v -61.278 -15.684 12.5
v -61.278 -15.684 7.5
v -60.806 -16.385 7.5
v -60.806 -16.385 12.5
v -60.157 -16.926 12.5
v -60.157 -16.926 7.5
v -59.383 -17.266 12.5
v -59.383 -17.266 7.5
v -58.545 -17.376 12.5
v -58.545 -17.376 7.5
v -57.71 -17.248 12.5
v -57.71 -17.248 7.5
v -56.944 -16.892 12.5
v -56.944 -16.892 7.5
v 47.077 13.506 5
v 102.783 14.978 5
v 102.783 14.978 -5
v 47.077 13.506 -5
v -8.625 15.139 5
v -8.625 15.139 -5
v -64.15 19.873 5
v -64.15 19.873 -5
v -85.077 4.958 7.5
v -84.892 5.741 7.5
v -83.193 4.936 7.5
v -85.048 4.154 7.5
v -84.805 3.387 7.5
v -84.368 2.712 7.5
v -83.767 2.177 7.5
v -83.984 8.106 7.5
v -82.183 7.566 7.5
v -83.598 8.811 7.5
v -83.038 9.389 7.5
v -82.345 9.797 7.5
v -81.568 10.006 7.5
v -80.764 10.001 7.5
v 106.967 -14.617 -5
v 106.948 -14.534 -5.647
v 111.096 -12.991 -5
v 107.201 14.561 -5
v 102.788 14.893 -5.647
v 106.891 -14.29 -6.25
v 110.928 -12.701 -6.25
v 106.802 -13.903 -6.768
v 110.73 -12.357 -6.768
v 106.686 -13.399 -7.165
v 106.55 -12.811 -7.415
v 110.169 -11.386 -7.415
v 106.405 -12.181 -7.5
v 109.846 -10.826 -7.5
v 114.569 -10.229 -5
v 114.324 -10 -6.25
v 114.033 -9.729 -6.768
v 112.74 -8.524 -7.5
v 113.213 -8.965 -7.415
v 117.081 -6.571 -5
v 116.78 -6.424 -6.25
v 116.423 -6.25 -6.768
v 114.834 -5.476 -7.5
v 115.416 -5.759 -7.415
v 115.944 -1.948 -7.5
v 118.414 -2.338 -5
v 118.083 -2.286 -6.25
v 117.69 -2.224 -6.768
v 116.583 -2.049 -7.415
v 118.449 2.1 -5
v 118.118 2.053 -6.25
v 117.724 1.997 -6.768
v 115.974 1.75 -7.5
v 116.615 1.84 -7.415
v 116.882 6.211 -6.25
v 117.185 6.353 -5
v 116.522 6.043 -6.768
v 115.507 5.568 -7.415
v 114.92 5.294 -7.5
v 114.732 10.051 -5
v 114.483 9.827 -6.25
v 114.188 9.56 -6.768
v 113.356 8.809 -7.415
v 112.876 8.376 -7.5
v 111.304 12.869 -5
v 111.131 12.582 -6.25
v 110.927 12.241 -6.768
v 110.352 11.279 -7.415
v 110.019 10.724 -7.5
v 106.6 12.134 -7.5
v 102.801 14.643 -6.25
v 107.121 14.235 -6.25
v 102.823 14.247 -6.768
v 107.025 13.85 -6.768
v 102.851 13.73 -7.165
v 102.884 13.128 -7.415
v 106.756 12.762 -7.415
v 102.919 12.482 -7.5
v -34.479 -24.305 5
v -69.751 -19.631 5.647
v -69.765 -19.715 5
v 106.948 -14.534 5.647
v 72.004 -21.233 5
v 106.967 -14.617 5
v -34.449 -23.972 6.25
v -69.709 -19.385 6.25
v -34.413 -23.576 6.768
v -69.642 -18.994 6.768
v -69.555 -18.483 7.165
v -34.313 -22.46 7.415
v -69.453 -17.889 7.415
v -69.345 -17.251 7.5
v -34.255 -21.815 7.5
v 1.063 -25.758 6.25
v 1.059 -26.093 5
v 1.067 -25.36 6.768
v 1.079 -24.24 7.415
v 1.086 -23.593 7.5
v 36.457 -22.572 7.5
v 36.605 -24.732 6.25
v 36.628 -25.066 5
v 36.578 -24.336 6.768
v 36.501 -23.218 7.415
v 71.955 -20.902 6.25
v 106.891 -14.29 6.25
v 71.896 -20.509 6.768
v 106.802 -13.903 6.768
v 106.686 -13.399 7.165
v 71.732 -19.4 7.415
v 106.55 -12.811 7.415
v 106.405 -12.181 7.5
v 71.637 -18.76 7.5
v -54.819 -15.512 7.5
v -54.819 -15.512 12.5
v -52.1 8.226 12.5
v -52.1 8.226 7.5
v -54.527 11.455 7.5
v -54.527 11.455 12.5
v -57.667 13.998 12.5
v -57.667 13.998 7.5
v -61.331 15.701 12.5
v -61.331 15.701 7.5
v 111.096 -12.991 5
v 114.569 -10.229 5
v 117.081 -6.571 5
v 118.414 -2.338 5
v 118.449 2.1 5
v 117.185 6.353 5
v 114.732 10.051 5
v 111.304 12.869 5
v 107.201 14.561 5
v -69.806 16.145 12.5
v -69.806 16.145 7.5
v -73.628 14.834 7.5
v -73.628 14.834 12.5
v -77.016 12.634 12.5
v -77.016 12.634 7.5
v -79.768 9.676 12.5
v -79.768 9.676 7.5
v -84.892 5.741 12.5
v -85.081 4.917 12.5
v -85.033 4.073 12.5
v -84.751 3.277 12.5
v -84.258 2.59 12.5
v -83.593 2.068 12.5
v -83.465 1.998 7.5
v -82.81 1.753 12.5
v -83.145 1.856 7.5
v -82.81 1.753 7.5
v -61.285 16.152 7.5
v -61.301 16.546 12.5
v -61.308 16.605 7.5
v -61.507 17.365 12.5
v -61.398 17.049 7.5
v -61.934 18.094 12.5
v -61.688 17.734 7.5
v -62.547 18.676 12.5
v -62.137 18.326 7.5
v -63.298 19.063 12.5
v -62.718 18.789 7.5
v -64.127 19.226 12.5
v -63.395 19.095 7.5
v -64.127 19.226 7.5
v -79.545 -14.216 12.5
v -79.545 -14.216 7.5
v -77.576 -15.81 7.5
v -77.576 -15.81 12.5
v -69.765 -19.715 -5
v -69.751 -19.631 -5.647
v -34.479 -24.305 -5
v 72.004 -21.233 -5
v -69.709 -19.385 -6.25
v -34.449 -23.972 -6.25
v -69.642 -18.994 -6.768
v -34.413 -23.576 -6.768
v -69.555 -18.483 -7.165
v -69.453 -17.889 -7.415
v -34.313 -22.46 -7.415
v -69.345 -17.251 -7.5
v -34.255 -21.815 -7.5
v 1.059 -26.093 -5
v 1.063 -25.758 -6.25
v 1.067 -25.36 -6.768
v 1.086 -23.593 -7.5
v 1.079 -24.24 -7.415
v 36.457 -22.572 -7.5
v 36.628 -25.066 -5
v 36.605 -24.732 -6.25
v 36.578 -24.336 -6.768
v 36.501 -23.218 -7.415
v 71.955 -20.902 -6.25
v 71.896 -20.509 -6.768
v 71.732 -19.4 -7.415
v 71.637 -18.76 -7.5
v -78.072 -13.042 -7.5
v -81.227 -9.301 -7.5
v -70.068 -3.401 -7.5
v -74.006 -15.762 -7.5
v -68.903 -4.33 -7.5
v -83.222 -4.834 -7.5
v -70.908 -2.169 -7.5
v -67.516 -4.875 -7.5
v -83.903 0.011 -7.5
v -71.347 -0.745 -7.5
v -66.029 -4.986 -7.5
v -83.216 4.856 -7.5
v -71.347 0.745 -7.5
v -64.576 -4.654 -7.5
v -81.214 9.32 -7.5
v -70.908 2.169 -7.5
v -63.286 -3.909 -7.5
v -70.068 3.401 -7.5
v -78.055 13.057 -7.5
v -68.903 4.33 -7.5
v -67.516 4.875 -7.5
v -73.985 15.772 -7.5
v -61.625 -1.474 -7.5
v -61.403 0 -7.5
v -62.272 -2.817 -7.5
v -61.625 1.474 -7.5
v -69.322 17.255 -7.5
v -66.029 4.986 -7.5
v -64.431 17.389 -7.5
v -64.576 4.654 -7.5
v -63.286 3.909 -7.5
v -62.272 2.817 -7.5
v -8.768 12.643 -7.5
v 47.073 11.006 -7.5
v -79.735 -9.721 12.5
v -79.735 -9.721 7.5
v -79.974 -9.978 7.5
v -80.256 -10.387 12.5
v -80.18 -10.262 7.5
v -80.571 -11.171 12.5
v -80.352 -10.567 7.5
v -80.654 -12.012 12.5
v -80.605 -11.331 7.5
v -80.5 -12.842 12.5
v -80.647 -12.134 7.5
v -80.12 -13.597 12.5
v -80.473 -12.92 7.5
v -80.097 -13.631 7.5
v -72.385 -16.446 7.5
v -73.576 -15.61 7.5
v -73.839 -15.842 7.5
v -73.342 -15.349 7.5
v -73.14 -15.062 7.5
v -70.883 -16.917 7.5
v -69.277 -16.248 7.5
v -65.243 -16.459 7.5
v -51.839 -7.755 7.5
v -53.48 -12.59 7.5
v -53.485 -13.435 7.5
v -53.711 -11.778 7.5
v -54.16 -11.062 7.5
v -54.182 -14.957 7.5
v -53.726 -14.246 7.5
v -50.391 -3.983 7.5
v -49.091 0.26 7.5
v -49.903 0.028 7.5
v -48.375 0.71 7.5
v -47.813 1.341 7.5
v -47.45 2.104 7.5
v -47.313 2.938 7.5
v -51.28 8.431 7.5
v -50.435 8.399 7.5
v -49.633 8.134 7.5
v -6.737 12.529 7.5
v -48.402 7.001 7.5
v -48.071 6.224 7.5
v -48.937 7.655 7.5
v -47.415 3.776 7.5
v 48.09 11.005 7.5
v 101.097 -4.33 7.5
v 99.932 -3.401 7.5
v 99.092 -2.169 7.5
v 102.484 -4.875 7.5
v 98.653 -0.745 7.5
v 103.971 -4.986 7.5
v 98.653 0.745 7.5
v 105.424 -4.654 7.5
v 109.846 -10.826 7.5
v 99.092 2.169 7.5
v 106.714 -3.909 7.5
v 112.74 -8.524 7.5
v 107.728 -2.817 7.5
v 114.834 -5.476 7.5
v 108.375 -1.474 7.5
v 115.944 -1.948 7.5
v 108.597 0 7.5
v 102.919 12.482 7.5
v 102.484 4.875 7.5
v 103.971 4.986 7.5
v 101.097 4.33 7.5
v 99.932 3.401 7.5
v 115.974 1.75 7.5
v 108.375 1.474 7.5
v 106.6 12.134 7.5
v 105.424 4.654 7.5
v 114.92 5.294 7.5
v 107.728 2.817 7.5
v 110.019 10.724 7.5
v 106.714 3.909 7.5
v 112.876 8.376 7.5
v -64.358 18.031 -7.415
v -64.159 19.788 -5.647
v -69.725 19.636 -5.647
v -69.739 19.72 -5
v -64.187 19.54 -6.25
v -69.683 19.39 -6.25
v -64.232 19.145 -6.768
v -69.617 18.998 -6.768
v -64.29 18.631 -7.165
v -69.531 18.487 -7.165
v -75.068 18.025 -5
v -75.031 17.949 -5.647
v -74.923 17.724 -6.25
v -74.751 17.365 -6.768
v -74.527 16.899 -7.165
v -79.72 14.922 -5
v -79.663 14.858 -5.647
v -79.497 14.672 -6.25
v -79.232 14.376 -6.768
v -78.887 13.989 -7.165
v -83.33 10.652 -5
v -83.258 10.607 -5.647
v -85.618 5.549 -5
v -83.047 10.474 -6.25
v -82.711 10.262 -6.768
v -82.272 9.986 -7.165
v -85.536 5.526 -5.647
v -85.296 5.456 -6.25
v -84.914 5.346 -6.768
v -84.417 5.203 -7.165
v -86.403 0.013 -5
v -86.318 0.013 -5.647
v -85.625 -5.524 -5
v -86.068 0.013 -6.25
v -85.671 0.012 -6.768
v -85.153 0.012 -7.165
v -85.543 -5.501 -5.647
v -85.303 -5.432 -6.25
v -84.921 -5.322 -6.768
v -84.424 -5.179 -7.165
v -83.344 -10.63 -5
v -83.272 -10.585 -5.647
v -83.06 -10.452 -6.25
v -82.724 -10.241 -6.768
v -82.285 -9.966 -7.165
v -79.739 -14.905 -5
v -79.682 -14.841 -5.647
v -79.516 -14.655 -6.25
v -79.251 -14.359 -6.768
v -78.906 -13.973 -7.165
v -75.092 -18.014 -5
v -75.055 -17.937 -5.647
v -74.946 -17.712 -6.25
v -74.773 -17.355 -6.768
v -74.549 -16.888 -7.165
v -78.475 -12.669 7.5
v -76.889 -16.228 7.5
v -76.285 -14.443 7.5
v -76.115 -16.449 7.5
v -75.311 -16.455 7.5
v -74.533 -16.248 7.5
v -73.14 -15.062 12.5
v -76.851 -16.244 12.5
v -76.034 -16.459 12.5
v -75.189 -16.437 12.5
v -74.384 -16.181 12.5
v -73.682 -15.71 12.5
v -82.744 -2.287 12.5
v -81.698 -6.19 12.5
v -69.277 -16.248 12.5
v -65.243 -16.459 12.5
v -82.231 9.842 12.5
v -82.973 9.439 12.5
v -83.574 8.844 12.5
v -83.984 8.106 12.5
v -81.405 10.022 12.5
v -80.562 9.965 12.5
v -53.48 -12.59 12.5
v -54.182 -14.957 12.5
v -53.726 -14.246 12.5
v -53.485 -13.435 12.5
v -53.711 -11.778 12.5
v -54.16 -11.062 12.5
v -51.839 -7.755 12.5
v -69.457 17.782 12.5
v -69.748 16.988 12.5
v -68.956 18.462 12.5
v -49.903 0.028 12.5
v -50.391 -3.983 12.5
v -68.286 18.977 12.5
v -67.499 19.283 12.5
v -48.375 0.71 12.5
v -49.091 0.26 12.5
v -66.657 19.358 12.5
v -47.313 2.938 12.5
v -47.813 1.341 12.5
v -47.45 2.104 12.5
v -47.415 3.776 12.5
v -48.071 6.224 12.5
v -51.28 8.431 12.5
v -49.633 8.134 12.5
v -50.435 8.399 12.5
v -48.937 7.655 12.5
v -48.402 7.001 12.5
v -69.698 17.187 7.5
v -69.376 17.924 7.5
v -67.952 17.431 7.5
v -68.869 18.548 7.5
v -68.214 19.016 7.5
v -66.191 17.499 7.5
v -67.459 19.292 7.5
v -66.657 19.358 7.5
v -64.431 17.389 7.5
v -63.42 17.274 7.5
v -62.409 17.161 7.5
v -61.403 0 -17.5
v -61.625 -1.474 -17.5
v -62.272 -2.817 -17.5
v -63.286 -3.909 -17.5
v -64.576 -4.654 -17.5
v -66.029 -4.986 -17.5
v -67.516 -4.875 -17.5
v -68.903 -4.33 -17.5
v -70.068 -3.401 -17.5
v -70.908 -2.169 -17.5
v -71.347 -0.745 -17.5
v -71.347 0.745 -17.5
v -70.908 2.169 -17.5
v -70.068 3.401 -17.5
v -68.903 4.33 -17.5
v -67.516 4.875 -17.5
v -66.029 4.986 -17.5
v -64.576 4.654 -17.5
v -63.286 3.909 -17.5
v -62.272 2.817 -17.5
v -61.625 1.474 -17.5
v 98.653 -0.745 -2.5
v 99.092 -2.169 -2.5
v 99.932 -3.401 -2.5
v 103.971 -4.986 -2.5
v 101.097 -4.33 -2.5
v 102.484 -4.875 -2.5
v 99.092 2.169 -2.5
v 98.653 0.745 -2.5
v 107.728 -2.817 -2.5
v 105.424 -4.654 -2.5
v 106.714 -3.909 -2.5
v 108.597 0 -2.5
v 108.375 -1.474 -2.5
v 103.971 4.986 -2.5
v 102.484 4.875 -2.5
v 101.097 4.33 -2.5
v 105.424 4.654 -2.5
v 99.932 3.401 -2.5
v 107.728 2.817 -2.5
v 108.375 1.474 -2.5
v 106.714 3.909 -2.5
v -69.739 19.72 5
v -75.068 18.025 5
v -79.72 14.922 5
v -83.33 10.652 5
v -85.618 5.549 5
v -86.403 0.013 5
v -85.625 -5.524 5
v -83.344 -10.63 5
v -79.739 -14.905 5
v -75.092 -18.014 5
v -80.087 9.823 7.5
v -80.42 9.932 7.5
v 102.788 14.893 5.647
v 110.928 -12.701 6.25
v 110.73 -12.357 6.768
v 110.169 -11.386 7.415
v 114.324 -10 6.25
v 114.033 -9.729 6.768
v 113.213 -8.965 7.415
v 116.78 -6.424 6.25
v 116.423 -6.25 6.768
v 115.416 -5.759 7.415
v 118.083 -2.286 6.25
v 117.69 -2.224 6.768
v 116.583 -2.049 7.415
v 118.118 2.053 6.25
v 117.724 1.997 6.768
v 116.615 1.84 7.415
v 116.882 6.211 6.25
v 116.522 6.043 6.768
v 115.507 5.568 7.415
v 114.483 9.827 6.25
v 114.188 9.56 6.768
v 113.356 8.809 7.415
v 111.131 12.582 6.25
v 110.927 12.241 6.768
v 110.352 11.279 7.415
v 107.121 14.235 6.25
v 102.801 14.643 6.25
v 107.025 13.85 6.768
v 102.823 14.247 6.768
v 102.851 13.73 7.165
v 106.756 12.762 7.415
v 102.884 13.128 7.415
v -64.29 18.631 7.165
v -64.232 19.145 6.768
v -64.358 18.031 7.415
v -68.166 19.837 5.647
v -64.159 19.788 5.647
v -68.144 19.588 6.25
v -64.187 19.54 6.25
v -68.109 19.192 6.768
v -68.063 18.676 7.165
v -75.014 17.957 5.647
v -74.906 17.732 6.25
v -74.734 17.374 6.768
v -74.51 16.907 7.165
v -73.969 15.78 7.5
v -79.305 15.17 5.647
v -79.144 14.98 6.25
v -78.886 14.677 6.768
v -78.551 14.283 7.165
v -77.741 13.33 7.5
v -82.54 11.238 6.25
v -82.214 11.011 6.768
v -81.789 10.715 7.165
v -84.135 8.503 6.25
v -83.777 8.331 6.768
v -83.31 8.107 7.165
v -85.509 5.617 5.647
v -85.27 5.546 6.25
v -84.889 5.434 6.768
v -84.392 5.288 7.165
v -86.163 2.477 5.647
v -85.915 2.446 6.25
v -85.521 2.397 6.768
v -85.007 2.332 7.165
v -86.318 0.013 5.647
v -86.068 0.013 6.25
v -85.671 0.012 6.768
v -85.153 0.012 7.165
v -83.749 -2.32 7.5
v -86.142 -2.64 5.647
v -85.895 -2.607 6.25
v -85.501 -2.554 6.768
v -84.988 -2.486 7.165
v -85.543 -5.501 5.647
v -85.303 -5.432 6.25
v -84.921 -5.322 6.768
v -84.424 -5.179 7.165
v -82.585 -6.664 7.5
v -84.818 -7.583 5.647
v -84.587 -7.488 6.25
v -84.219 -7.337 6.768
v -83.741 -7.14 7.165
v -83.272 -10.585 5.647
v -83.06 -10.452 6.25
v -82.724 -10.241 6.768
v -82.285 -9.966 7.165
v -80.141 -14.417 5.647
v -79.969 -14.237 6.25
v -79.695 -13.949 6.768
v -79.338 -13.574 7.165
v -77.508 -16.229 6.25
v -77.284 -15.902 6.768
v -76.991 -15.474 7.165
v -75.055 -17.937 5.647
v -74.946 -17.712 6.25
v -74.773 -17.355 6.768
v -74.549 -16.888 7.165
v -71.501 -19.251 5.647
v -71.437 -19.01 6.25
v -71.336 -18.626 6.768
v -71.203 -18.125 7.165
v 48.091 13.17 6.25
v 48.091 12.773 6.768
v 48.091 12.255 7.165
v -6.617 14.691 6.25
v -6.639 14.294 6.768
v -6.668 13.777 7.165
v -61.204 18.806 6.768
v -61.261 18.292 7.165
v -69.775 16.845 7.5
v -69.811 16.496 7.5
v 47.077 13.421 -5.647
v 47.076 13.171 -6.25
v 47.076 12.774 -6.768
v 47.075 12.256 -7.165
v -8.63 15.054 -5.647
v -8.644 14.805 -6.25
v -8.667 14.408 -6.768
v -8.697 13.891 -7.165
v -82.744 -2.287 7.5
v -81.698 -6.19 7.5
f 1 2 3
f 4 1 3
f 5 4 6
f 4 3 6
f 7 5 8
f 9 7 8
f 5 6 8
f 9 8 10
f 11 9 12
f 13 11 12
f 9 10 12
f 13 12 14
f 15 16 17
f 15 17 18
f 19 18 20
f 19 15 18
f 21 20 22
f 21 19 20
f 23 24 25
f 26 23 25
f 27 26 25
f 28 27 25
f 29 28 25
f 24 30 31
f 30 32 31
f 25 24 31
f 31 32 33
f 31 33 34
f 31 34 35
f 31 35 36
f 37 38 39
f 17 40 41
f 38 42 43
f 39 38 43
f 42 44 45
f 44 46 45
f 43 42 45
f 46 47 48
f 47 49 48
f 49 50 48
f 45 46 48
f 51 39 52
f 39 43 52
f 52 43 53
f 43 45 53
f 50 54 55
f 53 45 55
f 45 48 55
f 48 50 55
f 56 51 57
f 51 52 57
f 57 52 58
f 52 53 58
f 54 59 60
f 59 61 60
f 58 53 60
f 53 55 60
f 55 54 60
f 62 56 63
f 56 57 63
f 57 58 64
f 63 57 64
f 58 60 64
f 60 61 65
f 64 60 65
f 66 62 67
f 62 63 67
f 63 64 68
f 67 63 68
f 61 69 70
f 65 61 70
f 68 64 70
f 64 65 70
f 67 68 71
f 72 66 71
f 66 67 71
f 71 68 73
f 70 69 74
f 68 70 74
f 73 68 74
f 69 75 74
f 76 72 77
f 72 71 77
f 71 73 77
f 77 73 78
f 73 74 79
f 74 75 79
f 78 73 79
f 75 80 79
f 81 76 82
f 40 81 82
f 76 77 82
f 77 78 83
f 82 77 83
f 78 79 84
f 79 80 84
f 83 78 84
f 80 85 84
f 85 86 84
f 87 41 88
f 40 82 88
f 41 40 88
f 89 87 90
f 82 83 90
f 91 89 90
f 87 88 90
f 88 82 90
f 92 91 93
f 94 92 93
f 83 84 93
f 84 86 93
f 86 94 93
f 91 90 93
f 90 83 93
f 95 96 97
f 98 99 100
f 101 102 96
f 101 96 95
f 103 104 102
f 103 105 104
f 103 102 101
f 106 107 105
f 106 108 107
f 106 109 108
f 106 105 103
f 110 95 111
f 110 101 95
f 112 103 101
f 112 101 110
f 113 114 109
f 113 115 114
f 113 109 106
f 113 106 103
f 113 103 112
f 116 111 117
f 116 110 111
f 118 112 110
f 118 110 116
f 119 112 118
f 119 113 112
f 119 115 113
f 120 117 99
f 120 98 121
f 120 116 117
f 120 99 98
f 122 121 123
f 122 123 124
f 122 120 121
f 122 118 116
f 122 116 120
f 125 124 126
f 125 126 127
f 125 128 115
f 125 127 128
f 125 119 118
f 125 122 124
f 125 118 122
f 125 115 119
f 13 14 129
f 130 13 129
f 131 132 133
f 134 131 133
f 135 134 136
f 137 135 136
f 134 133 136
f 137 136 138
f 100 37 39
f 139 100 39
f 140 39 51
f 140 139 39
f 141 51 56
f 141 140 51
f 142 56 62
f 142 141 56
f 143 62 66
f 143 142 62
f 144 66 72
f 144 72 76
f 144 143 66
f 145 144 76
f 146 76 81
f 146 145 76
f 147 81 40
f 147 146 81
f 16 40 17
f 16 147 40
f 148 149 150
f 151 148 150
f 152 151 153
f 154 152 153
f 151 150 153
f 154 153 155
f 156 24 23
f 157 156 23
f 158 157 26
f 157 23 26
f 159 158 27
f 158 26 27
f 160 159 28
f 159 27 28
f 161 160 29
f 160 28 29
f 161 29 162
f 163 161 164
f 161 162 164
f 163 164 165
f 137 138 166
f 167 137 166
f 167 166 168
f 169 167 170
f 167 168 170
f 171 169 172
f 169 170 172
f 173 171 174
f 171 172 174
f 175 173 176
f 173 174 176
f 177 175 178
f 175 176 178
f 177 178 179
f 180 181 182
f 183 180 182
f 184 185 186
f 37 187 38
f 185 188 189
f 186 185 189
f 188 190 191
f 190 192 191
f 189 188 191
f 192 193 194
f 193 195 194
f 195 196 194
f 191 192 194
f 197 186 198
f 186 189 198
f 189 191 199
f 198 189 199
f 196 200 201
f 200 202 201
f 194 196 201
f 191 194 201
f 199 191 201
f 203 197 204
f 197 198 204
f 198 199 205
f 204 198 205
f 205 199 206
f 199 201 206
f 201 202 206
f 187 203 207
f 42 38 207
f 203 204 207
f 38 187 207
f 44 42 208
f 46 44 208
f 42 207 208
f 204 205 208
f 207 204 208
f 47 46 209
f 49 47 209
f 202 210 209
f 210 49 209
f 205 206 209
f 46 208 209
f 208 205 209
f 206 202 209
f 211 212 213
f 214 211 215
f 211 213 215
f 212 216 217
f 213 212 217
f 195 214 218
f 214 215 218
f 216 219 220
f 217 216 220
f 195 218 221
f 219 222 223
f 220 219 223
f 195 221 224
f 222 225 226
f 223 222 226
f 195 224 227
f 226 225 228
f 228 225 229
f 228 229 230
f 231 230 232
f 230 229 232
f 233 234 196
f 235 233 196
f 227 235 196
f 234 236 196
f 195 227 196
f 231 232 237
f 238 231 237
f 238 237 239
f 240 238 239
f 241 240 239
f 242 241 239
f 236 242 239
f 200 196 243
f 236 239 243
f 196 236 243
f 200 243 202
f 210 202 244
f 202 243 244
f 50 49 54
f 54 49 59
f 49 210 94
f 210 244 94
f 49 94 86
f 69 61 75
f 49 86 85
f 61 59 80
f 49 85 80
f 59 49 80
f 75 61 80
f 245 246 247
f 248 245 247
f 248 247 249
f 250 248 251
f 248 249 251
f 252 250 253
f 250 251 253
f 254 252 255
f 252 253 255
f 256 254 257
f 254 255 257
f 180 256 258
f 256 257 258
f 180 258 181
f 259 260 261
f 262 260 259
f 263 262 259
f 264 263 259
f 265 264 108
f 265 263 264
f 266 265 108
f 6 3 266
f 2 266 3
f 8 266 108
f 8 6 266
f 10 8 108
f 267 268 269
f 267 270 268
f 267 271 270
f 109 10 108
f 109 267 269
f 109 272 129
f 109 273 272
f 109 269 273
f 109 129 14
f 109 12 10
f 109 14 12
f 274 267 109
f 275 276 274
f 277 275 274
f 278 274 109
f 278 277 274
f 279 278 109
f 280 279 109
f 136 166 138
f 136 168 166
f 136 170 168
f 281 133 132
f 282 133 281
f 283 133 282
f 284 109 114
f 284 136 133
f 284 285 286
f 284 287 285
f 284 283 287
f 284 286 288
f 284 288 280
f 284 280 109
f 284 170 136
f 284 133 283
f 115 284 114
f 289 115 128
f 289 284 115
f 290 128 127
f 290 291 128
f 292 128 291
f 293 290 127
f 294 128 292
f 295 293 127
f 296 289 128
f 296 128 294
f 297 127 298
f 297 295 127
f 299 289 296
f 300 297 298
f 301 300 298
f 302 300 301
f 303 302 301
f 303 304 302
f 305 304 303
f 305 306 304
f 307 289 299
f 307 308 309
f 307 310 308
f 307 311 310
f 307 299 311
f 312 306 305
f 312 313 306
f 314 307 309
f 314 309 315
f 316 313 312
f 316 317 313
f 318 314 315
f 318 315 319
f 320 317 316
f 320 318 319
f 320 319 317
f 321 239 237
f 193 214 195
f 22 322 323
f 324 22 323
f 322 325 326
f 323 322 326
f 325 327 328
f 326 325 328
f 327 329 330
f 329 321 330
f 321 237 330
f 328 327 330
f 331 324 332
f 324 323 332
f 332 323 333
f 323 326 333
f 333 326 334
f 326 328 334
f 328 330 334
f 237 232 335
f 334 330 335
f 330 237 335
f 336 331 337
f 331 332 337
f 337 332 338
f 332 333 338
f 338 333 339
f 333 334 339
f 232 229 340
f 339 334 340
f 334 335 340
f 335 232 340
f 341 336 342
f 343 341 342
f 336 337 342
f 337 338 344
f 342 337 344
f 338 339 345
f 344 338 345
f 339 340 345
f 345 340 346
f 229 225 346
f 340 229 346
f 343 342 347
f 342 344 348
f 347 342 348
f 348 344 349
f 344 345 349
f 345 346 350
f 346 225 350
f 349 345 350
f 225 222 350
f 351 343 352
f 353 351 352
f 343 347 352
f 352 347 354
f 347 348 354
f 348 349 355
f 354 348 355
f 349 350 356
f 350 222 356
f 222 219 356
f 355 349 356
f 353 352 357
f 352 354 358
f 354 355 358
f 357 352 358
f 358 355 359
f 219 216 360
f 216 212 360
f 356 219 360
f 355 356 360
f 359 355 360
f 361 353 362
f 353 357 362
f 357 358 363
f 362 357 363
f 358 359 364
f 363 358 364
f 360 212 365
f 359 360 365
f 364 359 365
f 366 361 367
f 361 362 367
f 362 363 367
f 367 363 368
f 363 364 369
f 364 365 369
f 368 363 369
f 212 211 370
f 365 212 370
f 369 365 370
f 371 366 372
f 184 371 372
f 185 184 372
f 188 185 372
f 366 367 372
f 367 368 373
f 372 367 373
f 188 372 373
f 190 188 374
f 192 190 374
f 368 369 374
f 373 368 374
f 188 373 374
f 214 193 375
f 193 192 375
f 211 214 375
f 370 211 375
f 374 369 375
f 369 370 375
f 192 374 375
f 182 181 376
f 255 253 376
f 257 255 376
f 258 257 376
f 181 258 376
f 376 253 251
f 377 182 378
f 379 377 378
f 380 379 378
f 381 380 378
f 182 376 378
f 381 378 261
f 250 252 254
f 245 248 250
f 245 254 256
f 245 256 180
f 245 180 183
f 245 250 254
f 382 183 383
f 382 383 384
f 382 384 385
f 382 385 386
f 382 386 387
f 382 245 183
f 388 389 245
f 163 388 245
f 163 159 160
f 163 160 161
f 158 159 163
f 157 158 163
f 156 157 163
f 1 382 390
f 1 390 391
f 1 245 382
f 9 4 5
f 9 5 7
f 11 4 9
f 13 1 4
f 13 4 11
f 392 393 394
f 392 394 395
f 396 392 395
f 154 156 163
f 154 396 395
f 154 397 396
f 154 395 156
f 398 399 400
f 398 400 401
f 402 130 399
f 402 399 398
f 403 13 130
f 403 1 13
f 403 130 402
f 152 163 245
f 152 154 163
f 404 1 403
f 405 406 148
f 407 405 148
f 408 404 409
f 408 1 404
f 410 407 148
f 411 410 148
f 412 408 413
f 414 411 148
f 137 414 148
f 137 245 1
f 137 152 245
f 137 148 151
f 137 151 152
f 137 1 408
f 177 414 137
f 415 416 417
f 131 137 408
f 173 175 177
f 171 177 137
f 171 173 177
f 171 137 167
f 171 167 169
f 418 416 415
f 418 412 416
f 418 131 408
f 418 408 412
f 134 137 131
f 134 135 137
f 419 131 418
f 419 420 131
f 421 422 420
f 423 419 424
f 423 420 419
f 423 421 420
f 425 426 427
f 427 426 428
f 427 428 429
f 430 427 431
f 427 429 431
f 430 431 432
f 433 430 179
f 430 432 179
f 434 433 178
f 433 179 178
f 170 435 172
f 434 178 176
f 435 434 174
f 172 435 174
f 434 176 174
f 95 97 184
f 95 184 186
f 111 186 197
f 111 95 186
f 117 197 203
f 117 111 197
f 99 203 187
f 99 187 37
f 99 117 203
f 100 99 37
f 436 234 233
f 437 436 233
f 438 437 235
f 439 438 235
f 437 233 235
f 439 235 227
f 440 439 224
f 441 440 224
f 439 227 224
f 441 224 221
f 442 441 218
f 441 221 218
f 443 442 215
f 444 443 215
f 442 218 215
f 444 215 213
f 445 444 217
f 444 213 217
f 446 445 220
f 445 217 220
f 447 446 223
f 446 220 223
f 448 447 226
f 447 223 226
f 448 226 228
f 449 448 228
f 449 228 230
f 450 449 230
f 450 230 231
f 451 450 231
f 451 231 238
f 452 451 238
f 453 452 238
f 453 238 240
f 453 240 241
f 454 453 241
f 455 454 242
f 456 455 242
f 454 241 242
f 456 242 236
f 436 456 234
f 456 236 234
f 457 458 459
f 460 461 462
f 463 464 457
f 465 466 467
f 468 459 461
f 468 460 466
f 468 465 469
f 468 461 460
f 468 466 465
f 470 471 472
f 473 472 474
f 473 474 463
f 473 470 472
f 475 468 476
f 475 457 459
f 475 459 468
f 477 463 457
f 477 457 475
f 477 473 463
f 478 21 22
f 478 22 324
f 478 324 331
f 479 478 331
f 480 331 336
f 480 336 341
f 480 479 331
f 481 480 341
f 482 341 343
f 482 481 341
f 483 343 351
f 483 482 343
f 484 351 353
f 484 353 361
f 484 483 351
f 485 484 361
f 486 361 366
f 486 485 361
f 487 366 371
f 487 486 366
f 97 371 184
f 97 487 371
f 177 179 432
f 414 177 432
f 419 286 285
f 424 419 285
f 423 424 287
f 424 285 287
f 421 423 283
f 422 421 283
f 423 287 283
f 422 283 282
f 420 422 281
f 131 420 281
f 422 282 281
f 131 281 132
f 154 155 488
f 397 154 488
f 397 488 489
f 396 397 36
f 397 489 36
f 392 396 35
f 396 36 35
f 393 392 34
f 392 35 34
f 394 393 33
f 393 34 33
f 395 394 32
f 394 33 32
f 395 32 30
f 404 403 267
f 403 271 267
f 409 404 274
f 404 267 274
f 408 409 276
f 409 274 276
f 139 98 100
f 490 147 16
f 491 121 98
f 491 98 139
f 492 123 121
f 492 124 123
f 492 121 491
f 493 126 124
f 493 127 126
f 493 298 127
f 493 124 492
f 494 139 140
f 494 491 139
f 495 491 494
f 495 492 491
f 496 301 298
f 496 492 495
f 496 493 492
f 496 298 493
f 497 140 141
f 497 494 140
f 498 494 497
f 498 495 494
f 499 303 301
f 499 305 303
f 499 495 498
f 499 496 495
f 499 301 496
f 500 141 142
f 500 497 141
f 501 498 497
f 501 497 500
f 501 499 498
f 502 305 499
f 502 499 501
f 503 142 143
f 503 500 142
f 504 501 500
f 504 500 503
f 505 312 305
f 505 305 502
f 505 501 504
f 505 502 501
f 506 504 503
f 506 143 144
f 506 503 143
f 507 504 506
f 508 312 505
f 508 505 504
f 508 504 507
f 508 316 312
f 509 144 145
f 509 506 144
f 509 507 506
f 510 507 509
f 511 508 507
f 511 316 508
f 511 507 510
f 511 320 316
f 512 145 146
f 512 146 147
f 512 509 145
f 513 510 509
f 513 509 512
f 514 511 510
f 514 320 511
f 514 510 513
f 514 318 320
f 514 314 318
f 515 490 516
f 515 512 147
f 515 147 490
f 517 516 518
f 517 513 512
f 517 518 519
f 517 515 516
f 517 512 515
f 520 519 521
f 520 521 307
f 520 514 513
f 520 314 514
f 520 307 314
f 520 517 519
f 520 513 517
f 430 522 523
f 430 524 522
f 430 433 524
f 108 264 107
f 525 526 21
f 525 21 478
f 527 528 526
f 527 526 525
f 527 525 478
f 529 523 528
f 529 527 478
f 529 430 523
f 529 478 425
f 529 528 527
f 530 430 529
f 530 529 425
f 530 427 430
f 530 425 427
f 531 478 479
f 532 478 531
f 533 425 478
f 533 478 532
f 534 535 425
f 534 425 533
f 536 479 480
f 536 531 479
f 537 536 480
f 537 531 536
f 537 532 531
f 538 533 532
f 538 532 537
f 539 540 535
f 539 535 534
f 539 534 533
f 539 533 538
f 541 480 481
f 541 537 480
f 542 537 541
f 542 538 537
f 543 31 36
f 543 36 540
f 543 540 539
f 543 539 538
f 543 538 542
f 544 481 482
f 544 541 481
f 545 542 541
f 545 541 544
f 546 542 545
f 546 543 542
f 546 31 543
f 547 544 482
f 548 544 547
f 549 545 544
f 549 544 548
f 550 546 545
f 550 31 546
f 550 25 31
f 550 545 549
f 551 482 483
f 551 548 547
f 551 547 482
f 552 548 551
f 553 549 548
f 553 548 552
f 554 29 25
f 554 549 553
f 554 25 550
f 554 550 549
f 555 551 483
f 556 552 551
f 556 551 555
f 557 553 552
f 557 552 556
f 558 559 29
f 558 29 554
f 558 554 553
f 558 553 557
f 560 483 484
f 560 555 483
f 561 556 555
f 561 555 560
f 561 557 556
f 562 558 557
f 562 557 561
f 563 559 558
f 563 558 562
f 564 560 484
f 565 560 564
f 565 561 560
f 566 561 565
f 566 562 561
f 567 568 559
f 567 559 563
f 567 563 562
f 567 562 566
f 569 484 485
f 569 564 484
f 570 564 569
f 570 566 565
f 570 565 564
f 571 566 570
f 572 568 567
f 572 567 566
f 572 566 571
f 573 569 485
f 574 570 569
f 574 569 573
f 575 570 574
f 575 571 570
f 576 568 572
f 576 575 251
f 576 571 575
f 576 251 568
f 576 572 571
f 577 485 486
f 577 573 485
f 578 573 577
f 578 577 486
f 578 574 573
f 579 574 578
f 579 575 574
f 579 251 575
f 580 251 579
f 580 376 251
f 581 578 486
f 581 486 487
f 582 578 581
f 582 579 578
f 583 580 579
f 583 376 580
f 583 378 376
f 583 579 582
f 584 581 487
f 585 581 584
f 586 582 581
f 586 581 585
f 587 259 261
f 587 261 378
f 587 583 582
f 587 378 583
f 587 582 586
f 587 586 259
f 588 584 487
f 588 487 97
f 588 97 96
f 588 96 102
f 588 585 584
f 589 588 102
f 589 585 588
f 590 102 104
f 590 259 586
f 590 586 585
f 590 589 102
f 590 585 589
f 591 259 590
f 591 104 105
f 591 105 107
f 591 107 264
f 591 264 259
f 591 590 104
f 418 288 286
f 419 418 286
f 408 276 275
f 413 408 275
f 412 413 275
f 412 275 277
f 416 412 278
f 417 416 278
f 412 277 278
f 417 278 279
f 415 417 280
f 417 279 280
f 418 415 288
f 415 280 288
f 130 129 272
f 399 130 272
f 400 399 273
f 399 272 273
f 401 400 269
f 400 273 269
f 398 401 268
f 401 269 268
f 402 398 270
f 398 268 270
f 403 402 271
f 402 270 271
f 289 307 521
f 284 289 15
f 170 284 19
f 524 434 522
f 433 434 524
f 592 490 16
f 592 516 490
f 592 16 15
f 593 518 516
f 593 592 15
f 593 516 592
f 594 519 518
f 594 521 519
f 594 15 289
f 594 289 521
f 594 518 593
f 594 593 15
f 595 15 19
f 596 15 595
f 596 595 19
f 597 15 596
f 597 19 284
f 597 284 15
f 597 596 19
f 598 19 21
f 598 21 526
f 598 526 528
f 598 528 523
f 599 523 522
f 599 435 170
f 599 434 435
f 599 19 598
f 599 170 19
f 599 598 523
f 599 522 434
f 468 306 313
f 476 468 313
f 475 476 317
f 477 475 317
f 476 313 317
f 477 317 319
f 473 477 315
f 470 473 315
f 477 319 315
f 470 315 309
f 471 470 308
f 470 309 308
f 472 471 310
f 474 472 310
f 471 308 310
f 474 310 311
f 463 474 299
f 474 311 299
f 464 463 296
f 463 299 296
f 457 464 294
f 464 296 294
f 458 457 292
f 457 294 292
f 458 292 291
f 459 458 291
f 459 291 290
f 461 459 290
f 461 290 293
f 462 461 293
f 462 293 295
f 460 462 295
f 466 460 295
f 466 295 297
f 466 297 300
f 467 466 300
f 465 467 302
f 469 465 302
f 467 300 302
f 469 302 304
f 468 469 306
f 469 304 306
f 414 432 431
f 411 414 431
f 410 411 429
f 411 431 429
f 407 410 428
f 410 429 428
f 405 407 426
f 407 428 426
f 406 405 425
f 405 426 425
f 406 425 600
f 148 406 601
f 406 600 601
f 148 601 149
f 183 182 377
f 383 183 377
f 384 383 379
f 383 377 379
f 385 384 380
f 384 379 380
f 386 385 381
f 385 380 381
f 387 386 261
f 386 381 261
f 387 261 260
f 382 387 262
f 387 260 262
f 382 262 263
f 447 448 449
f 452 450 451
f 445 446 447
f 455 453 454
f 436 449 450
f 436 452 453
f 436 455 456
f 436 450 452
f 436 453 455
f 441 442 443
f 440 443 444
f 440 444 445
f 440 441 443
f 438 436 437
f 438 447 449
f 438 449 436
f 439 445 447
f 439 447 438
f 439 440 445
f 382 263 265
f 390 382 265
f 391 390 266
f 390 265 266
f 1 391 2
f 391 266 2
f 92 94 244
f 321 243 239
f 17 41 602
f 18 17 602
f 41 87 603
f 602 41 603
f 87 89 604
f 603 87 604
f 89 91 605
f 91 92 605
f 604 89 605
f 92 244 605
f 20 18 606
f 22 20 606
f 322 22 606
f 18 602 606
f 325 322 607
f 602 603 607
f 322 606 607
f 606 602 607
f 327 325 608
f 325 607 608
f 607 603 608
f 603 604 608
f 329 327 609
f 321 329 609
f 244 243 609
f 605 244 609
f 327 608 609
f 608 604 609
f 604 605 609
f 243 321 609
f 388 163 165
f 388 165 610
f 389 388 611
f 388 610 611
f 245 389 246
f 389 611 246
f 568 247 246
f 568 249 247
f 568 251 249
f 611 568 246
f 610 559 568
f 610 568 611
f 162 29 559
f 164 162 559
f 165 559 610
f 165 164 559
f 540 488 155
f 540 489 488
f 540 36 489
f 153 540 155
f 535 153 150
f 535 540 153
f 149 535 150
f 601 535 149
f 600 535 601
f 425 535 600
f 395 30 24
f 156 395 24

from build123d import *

# Parameters (mm, degrees)
BOSS_EXTRUDE1_DEPTH = 7.5
FILLET1_R           = 2.5
SKETCH3_R           = 16.5
BOSS_EXTRUDE2_DEPTH = 5
BOSS_EXTRUDE3_START = -5
BOSS_EXTRUDE3_DEPTH = 5
SKETCH5_R           = 5
BOSS_EXTRUDE4_DEPTH = 10
SKETCH6_R           = 5
CUT_EXTRUDE1_DEPTH  = 10


with BuildPart() as part:
    # Sketch2 → Boss-Extrude1 (new, symmetric)
    with BuildSketch(Plane.XY):
        with BuildLine():
            ThreePointArc((102.783087905, 14.977902914), (19.214406157, 13.934366249), (-64.149557364, 19.872642429))
            ThreePointArc((-64.149557364, 19.872642429), (-86.204808933, 2.808746854), (-69.764850677, -19.715427415))
            ThreePointArc((-69.764850677, -19.715427415), (18.853783166, -25.931146508), (106.966657885, -14.61660998))
            ThreePointArc((106.966657885, -14.61660998), (118.44931566, 2.099570811), (102.783087905, 14.977902914))
        make_face()
    extrude(amount=BOSS_EXTRUDE1_DEPTH, both=True)

    # Fillet1
    fillet1_edges = [part.edges().sort_by_distance(p)[0] for p in [
        (18.853783166, -25.931146508, -7.5),
        (118.44931566, 2.099570811, -7.5),
        (118.44931566, 2.099570811, 7.5),
        (-86.204808933, 2.808746854, -7.5),
        (-86.204808933, 2.808746854, 7.5),
        (19.214406157, 13.934366249, -7.5),
        (19.214406157, 13.934366249, 7.5),
        (18.853783166, -25.931146508, 7.5),
    ]]
    fillet(fillet1_edges, radius=FILLET1_R)

    # Sketch3 → Boss-Extrude2 (add)
    with BuildSketch(Plane.XY.offset(7.5)):
        with Locations((-66.403017571, 0)):
            Circle(SKETCH3_R)
    extrude(amount=BOSS_EXTRUDE2_DEPTH)

    # Sketch4 → Boss-Extrude3 (add)
    with BuildSketch(Plane.XY.offset(12.5).offset(BOSS_EXTRUDE3_START)):
        with BuildLine():
            ThreePointArc((-52.099568751, 8.225652062), (-50.465241438, 4.270514244), (-49.9030415, 0.028100762))
            ThreePointArc((-49.9030415, 0.028100762), (-47.813230422, 1.340878735), (-47.414916211, 3.776457135))
            Line((-47.414916211, 3.776457135), (-48.070610856, 6.223542865))
            ThreePointArc((-48.070610856, 6.223542865), (-49.633350281, 8.133658527), (-52.099568751, 8.225652062))
        make_face()
        with BuildLine():
            ThreePointArc((-54.819051353, -15.511974356), (-53.485336446, -13.435462641), (-54.159948813, -11.061521929))
            ThreePointArc((-54.159948813, -11.061521929), (-57.416473494, -13.838064371), (-61.277519146, -15.683726148))
            ThreePointArc((-61.277519146, -15.683726148), (-59.383205961, -17.265583889), (-56.943747393, -16.891768097))
            Line((-56.943747393, -16.891768097), (-54.819051353, -15.511974356))
        make_face()
        with BuildLine():
            ThreePointArc((-77.576139439, -15.810470249), (-75.18911887, -16.437231094), (-73.139833772, -15.062048582))
            ThreePointArc((-73.139833772, -15.062048582), (-76.786804024, -12.822908364), (-79.735261406, -9.721176591))
            ThreePointArc((-79.735261406, -9.721176591), (-80.654322552, -12.011596414), (-79.544968453, -14.21614395))
            Line((-79.544968453, -14.21614395), (-77.576139439, -15.810470249))
        make_face()
        with BuildLine():
            ThreePointArc((-84.892352865, 5.740566364), (-84.750807928, 3.276695145), (-82.809667718, 1.752663965))
            ThreePointArc((-82.809667718, 1.752663965), (-81.807094609, 5.913071167), (-79.768295833, 9.675708604))
            ThreePointArc((-79.768295833, 9.675708604), (-82.230620043, 9.842009046), (-83.984460073, 8.105707948))
            Line((-83.984460073, 8.105707948), (-84.892352865, 5.740566364))
        make_face()
        with BuildLine():
            ThreePointArc((-66.656933344, 19.358335376), (-68.956474332, 18.462340064), (-69.806068802, 16.145254483))
            ThreePointArc((-69.806068802, 16.145254483), (-65.539474293, 16.477387323), (-61.330969971, 15.701093374))
            ThreePointArc((-61.330969971, 15.701093374), (-61.933708879, 18.094292522), (-64.126995727, 19.225746964))
            Line((-64.126995727, 19.225746964), (-66.656933344, 19.358335376))
        make_face()
    extrude(amount=BOSS_EXTRUDE3_DEPTH)

    # Sketch5 → Boss-Extrude4 (add)
    with BuildSketch(Plane(origin=(0, 0, -7.5), x_dir=(-1, 0, 0), z_dir=(0, 0, -1))):
        with Locations(Location((66.403017571, 0, 0), (0, 0, 180))):
            Circle(SKETCH5_R)
    extrude(amount=BOSS_EXTRUDE4_DEPTH)

    # Sketch6 → Cut-Extrude1 (cut)
    with BuildSketch(Plane.XY.offset(7.5)):
        with Locations((103.596982429, 0)):
            Circle(SKETCH6_R)
    extrude(amount=-CUT_EXTRUDE1_DEPTH, mode=Mode.SUBTRACT)


solid = part.part
